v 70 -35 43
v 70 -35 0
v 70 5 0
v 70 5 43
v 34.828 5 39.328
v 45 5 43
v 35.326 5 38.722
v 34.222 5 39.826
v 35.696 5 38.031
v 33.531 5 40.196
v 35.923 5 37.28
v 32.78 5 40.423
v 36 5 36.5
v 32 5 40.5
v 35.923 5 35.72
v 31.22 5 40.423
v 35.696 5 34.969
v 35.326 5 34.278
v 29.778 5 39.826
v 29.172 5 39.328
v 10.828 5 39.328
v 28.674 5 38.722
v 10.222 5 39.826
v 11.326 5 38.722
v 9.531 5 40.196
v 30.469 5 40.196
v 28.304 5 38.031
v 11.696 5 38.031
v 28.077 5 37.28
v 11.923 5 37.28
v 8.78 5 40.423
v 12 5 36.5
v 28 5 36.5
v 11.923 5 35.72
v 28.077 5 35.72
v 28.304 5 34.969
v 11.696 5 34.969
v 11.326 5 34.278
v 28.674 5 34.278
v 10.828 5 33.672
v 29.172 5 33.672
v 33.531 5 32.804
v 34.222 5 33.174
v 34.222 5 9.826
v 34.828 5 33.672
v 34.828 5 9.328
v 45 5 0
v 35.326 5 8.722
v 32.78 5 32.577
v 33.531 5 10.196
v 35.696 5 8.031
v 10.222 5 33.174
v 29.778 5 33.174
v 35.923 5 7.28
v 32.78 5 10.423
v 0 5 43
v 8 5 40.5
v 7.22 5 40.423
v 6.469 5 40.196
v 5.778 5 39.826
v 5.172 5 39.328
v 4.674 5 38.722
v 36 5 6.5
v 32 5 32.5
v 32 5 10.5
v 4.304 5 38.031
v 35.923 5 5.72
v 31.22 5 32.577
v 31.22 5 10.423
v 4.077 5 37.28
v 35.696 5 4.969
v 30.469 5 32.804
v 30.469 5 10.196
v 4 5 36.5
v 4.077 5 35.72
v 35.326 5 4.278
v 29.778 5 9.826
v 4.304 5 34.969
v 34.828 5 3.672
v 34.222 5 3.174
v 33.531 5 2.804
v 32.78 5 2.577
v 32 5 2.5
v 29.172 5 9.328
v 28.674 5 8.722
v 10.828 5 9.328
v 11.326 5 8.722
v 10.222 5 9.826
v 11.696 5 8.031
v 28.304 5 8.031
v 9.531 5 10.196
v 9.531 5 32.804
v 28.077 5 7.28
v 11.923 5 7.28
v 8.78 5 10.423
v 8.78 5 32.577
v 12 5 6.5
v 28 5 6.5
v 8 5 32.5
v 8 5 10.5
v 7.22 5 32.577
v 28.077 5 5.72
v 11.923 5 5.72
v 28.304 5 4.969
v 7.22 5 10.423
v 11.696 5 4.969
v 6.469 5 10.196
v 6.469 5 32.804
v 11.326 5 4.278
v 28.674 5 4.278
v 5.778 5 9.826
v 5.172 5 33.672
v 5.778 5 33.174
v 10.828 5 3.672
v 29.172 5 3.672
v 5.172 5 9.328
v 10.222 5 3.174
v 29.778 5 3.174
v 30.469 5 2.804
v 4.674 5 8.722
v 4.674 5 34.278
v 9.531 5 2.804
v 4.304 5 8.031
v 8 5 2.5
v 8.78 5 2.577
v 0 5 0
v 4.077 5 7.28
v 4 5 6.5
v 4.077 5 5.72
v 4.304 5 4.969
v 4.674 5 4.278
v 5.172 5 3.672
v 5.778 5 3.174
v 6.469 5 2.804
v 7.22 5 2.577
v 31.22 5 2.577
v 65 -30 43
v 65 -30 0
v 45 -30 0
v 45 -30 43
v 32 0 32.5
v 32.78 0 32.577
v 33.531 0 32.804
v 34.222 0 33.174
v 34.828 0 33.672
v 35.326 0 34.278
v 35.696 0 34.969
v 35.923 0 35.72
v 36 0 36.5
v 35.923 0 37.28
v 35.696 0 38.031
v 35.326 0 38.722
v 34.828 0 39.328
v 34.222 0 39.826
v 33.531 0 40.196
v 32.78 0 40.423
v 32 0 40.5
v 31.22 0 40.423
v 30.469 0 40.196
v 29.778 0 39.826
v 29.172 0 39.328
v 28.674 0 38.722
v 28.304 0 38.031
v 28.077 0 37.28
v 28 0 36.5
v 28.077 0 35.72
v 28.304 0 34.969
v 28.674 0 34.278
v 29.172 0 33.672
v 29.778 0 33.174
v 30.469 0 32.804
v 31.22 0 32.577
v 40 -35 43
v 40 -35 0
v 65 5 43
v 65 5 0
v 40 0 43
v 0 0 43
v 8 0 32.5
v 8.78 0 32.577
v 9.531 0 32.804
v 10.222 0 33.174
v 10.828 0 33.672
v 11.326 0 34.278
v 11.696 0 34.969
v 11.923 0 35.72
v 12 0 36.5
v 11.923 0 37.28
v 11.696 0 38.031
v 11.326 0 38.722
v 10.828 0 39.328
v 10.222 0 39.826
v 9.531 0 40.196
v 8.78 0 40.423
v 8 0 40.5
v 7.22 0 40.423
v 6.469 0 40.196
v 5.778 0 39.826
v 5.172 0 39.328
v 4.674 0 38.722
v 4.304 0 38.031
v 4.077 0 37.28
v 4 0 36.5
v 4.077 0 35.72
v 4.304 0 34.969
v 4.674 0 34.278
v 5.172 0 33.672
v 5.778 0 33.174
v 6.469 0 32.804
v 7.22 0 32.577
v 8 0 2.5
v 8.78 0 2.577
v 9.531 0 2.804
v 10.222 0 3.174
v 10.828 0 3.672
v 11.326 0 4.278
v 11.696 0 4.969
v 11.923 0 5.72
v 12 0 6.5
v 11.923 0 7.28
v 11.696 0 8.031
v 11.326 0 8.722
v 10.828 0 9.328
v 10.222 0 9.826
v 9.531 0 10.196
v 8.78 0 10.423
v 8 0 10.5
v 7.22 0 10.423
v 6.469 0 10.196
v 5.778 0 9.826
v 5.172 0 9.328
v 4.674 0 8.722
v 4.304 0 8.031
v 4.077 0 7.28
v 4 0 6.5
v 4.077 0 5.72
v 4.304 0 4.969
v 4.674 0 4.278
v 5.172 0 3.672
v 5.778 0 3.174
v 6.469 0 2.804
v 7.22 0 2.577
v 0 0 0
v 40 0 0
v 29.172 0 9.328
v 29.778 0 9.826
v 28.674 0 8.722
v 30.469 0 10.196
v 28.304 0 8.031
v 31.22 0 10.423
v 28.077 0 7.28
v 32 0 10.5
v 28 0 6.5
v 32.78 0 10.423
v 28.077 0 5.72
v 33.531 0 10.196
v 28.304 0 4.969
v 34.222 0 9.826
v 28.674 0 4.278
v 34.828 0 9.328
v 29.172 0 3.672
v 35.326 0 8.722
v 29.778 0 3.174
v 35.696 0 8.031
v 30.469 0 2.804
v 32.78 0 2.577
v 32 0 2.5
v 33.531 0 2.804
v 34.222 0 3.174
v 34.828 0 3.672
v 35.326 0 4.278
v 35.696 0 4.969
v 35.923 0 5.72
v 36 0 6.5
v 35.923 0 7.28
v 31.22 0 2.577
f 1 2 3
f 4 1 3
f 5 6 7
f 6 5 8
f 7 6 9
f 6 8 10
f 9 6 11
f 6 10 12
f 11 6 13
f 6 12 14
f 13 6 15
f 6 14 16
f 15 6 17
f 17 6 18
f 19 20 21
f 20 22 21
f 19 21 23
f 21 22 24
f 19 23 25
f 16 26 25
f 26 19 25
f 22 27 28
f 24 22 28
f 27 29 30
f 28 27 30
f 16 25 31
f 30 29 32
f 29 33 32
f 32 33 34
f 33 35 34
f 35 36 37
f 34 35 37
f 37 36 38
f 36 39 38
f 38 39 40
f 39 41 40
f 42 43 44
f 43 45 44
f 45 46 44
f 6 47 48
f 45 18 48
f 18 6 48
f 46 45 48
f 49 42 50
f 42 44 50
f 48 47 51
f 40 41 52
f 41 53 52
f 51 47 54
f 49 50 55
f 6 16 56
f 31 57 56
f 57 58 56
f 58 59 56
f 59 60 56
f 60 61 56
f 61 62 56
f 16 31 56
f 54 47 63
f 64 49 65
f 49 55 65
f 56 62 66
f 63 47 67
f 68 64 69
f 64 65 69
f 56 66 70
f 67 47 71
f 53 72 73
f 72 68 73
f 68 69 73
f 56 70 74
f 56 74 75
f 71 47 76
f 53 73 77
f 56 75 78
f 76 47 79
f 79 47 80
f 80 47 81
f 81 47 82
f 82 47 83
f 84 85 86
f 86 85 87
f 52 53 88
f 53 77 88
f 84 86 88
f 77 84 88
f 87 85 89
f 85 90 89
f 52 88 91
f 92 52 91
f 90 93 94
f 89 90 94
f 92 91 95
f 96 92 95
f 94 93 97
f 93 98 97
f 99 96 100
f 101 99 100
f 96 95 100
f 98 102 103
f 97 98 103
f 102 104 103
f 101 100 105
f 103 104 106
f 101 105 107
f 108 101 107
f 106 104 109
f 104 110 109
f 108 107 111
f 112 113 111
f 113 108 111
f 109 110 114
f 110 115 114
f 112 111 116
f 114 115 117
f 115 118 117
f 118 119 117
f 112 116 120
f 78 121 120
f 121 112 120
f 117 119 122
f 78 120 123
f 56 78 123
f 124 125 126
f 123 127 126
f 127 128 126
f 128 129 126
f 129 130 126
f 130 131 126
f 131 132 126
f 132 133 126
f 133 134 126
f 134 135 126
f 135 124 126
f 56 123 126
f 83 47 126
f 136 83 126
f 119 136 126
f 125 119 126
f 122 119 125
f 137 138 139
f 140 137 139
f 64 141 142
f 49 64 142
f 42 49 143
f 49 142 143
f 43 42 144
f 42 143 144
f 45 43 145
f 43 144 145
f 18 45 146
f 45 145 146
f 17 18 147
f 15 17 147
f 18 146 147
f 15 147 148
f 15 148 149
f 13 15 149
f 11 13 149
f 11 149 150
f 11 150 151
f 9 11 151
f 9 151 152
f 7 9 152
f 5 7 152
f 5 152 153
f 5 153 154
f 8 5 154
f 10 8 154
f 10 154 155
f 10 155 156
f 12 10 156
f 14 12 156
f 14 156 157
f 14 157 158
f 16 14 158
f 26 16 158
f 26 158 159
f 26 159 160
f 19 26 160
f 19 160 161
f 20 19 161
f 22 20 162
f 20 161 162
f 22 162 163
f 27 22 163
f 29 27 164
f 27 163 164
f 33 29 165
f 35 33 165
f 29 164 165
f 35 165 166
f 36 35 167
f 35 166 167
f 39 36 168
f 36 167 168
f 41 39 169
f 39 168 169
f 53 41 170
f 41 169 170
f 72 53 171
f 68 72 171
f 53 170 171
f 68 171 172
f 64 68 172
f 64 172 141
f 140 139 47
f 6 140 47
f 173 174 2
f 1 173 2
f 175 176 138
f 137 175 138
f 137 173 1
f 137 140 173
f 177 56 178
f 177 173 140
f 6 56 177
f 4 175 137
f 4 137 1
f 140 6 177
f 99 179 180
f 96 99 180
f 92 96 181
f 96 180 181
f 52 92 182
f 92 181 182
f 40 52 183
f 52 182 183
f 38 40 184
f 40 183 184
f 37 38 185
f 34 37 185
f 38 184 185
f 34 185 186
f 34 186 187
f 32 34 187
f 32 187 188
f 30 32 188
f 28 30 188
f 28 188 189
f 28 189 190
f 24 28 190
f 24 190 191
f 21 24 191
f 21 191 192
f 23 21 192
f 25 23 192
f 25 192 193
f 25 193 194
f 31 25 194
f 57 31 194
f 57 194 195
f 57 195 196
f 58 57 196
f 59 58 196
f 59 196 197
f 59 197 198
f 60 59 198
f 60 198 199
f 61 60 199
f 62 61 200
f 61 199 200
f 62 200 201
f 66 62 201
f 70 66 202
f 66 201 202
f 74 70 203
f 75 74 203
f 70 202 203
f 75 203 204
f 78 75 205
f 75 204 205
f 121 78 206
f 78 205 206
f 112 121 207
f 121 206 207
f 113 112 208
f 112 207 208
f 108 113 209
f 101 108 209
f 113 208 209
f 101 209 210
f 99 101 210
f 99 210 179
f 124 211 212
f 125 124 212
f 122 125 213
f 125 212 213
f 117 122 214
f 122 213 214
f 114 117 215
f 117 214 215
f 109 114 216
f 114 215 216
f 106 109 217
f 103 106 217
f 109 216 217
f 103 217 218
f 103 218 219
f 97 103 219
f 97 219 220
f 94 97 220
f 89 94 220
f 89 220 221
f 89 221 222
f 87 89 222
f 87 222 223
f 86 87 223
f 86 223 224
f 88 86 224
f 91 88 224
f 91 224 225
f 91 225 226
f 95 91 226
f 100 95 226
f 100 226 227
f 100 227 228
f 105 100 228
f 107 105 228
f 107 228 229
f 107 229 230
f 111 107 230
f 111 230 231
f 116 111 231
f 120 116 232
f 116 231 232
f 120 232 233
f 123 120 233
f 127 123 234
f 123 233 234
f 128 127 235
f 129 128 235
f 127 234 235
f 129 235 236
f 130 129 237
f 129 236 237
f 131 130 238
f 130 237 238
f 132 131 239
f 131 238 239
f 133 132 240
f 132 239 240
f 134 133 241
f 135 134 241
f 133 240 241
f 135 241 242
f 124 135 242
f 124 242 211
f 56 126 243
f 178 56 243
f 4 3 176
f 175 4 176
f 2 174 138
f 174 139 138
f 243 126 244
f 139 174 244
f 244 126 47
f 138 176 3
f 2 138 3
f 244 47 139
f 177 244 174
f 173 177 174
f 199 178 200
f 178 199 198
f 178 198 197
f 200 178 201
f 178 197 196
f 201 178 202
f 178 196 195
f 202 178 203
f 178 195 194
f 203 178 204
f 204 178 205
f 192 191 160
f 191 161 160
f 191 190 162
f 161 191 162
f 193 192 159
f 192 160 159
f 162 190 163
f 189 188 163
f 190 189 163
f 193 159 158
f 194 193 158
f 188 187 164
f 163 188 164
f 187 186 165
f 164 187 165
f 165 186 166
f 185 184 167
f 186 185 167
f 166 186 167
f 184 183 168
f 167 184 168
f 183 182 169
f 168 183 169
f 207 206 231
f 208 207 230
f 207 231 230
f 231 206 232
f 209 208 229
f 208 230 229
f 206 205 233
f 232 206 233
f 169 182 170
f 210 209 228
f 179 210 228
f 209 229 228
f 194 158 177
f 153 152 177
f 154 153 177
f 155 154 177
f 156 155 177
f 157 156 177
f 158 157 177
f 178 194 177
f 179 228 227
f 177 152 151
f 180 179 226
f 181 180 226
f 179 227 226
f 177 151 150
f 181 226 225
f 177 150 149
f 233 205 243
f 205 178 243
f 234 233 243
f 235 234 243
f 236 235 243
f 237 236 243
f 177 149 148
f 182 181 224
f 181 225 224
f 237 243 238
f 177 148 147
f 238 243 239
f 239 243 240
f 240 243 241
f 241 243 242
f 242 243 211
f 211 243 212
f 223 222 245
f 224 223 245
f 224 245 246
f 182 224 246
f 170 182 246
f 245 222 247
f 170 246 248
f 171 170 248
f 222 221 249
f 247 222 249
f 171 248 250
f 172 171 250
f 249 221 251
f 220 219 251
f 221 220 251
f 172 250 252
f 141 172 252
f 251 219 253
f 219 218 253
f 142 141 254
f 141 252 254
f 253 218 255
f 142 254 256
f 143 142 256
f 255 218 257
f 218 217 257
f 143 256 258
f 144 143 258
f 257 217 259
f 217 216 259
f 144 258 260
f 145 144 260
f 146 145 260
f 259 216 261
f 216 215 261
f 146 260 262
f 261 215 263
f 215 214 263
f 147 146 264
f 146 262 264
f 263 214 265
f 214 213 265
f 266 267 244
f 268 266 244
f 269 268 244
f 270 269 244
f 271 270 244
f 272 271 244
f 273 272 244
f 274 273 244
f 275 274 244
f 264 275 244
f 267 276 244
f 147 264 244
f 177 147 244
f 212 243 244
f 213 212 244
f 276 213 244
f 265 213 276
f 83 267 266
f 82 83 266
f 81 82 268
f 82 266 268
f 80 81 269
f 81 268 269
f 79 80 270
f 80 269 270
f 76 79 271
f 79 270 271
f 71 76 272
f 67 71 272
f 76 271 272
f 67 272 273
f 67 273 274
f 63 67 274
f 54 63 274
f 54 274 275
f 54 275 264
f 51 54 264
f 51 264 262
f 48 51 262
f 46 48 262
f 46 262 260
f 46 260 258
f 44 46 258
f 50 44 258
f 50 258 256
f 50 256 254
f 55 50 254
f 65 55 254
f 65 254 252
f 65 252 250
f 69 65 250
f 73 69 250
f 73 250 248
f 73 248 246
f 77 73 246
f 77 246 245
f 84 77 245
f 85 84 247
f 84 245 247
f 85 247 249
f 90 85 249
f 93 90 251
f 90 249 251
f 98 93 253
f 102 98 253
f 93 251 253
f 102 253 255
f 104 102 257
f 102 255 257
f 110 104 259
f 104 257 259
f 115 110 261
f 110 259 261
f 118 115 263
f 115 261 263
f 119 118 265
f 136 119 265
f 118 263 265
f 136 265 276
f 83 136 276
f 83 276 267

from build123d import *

# Parameters (mm, degrees)
BOSS_EXTRUDE1_DEPTH = 43
SKETCH2_R           = 4
CUT_EXTRUDE2_DEPTH  = 10


with BuildPart() as part:
    # Sketch1 → Boss-Extrude1 (new body)
    with BuildSketch(Plane.XY):
        Polygon((0, 0), (40, 0), (40, -35), (70, -35), (70, 5), (65, 5), (65, -30), (45, -30), (45, 5), (0, 5), align=None)
    extrude(amount=BOSS_EXTRUDE1_DEPTH)

    # Sketch2 → Cut-Extrude2 (cut)
    with BuildSketch(Plane.XZ):
        with Locations(Location((8, 36.5, 0), (0, 0, 270))):
            Circle(SKETCH2_R)
        with Locations(Location((32, 36.5, 0), (0, 0, 270))):
            Circle(SKETCH2_R)
        with Locations(Location((32, 6.5, 0), (0, 0, 270))):
            Circle(SKETCH2_R)
        with Locations(Location((8, 6.5, 0), (0, 0, 270))):
            Circle(SKETCH2_R)
    extrude(amount=-CUT_EXTRUDE2_DEPTH, mode=Mode.SUBTRACT)


solid = part.part
